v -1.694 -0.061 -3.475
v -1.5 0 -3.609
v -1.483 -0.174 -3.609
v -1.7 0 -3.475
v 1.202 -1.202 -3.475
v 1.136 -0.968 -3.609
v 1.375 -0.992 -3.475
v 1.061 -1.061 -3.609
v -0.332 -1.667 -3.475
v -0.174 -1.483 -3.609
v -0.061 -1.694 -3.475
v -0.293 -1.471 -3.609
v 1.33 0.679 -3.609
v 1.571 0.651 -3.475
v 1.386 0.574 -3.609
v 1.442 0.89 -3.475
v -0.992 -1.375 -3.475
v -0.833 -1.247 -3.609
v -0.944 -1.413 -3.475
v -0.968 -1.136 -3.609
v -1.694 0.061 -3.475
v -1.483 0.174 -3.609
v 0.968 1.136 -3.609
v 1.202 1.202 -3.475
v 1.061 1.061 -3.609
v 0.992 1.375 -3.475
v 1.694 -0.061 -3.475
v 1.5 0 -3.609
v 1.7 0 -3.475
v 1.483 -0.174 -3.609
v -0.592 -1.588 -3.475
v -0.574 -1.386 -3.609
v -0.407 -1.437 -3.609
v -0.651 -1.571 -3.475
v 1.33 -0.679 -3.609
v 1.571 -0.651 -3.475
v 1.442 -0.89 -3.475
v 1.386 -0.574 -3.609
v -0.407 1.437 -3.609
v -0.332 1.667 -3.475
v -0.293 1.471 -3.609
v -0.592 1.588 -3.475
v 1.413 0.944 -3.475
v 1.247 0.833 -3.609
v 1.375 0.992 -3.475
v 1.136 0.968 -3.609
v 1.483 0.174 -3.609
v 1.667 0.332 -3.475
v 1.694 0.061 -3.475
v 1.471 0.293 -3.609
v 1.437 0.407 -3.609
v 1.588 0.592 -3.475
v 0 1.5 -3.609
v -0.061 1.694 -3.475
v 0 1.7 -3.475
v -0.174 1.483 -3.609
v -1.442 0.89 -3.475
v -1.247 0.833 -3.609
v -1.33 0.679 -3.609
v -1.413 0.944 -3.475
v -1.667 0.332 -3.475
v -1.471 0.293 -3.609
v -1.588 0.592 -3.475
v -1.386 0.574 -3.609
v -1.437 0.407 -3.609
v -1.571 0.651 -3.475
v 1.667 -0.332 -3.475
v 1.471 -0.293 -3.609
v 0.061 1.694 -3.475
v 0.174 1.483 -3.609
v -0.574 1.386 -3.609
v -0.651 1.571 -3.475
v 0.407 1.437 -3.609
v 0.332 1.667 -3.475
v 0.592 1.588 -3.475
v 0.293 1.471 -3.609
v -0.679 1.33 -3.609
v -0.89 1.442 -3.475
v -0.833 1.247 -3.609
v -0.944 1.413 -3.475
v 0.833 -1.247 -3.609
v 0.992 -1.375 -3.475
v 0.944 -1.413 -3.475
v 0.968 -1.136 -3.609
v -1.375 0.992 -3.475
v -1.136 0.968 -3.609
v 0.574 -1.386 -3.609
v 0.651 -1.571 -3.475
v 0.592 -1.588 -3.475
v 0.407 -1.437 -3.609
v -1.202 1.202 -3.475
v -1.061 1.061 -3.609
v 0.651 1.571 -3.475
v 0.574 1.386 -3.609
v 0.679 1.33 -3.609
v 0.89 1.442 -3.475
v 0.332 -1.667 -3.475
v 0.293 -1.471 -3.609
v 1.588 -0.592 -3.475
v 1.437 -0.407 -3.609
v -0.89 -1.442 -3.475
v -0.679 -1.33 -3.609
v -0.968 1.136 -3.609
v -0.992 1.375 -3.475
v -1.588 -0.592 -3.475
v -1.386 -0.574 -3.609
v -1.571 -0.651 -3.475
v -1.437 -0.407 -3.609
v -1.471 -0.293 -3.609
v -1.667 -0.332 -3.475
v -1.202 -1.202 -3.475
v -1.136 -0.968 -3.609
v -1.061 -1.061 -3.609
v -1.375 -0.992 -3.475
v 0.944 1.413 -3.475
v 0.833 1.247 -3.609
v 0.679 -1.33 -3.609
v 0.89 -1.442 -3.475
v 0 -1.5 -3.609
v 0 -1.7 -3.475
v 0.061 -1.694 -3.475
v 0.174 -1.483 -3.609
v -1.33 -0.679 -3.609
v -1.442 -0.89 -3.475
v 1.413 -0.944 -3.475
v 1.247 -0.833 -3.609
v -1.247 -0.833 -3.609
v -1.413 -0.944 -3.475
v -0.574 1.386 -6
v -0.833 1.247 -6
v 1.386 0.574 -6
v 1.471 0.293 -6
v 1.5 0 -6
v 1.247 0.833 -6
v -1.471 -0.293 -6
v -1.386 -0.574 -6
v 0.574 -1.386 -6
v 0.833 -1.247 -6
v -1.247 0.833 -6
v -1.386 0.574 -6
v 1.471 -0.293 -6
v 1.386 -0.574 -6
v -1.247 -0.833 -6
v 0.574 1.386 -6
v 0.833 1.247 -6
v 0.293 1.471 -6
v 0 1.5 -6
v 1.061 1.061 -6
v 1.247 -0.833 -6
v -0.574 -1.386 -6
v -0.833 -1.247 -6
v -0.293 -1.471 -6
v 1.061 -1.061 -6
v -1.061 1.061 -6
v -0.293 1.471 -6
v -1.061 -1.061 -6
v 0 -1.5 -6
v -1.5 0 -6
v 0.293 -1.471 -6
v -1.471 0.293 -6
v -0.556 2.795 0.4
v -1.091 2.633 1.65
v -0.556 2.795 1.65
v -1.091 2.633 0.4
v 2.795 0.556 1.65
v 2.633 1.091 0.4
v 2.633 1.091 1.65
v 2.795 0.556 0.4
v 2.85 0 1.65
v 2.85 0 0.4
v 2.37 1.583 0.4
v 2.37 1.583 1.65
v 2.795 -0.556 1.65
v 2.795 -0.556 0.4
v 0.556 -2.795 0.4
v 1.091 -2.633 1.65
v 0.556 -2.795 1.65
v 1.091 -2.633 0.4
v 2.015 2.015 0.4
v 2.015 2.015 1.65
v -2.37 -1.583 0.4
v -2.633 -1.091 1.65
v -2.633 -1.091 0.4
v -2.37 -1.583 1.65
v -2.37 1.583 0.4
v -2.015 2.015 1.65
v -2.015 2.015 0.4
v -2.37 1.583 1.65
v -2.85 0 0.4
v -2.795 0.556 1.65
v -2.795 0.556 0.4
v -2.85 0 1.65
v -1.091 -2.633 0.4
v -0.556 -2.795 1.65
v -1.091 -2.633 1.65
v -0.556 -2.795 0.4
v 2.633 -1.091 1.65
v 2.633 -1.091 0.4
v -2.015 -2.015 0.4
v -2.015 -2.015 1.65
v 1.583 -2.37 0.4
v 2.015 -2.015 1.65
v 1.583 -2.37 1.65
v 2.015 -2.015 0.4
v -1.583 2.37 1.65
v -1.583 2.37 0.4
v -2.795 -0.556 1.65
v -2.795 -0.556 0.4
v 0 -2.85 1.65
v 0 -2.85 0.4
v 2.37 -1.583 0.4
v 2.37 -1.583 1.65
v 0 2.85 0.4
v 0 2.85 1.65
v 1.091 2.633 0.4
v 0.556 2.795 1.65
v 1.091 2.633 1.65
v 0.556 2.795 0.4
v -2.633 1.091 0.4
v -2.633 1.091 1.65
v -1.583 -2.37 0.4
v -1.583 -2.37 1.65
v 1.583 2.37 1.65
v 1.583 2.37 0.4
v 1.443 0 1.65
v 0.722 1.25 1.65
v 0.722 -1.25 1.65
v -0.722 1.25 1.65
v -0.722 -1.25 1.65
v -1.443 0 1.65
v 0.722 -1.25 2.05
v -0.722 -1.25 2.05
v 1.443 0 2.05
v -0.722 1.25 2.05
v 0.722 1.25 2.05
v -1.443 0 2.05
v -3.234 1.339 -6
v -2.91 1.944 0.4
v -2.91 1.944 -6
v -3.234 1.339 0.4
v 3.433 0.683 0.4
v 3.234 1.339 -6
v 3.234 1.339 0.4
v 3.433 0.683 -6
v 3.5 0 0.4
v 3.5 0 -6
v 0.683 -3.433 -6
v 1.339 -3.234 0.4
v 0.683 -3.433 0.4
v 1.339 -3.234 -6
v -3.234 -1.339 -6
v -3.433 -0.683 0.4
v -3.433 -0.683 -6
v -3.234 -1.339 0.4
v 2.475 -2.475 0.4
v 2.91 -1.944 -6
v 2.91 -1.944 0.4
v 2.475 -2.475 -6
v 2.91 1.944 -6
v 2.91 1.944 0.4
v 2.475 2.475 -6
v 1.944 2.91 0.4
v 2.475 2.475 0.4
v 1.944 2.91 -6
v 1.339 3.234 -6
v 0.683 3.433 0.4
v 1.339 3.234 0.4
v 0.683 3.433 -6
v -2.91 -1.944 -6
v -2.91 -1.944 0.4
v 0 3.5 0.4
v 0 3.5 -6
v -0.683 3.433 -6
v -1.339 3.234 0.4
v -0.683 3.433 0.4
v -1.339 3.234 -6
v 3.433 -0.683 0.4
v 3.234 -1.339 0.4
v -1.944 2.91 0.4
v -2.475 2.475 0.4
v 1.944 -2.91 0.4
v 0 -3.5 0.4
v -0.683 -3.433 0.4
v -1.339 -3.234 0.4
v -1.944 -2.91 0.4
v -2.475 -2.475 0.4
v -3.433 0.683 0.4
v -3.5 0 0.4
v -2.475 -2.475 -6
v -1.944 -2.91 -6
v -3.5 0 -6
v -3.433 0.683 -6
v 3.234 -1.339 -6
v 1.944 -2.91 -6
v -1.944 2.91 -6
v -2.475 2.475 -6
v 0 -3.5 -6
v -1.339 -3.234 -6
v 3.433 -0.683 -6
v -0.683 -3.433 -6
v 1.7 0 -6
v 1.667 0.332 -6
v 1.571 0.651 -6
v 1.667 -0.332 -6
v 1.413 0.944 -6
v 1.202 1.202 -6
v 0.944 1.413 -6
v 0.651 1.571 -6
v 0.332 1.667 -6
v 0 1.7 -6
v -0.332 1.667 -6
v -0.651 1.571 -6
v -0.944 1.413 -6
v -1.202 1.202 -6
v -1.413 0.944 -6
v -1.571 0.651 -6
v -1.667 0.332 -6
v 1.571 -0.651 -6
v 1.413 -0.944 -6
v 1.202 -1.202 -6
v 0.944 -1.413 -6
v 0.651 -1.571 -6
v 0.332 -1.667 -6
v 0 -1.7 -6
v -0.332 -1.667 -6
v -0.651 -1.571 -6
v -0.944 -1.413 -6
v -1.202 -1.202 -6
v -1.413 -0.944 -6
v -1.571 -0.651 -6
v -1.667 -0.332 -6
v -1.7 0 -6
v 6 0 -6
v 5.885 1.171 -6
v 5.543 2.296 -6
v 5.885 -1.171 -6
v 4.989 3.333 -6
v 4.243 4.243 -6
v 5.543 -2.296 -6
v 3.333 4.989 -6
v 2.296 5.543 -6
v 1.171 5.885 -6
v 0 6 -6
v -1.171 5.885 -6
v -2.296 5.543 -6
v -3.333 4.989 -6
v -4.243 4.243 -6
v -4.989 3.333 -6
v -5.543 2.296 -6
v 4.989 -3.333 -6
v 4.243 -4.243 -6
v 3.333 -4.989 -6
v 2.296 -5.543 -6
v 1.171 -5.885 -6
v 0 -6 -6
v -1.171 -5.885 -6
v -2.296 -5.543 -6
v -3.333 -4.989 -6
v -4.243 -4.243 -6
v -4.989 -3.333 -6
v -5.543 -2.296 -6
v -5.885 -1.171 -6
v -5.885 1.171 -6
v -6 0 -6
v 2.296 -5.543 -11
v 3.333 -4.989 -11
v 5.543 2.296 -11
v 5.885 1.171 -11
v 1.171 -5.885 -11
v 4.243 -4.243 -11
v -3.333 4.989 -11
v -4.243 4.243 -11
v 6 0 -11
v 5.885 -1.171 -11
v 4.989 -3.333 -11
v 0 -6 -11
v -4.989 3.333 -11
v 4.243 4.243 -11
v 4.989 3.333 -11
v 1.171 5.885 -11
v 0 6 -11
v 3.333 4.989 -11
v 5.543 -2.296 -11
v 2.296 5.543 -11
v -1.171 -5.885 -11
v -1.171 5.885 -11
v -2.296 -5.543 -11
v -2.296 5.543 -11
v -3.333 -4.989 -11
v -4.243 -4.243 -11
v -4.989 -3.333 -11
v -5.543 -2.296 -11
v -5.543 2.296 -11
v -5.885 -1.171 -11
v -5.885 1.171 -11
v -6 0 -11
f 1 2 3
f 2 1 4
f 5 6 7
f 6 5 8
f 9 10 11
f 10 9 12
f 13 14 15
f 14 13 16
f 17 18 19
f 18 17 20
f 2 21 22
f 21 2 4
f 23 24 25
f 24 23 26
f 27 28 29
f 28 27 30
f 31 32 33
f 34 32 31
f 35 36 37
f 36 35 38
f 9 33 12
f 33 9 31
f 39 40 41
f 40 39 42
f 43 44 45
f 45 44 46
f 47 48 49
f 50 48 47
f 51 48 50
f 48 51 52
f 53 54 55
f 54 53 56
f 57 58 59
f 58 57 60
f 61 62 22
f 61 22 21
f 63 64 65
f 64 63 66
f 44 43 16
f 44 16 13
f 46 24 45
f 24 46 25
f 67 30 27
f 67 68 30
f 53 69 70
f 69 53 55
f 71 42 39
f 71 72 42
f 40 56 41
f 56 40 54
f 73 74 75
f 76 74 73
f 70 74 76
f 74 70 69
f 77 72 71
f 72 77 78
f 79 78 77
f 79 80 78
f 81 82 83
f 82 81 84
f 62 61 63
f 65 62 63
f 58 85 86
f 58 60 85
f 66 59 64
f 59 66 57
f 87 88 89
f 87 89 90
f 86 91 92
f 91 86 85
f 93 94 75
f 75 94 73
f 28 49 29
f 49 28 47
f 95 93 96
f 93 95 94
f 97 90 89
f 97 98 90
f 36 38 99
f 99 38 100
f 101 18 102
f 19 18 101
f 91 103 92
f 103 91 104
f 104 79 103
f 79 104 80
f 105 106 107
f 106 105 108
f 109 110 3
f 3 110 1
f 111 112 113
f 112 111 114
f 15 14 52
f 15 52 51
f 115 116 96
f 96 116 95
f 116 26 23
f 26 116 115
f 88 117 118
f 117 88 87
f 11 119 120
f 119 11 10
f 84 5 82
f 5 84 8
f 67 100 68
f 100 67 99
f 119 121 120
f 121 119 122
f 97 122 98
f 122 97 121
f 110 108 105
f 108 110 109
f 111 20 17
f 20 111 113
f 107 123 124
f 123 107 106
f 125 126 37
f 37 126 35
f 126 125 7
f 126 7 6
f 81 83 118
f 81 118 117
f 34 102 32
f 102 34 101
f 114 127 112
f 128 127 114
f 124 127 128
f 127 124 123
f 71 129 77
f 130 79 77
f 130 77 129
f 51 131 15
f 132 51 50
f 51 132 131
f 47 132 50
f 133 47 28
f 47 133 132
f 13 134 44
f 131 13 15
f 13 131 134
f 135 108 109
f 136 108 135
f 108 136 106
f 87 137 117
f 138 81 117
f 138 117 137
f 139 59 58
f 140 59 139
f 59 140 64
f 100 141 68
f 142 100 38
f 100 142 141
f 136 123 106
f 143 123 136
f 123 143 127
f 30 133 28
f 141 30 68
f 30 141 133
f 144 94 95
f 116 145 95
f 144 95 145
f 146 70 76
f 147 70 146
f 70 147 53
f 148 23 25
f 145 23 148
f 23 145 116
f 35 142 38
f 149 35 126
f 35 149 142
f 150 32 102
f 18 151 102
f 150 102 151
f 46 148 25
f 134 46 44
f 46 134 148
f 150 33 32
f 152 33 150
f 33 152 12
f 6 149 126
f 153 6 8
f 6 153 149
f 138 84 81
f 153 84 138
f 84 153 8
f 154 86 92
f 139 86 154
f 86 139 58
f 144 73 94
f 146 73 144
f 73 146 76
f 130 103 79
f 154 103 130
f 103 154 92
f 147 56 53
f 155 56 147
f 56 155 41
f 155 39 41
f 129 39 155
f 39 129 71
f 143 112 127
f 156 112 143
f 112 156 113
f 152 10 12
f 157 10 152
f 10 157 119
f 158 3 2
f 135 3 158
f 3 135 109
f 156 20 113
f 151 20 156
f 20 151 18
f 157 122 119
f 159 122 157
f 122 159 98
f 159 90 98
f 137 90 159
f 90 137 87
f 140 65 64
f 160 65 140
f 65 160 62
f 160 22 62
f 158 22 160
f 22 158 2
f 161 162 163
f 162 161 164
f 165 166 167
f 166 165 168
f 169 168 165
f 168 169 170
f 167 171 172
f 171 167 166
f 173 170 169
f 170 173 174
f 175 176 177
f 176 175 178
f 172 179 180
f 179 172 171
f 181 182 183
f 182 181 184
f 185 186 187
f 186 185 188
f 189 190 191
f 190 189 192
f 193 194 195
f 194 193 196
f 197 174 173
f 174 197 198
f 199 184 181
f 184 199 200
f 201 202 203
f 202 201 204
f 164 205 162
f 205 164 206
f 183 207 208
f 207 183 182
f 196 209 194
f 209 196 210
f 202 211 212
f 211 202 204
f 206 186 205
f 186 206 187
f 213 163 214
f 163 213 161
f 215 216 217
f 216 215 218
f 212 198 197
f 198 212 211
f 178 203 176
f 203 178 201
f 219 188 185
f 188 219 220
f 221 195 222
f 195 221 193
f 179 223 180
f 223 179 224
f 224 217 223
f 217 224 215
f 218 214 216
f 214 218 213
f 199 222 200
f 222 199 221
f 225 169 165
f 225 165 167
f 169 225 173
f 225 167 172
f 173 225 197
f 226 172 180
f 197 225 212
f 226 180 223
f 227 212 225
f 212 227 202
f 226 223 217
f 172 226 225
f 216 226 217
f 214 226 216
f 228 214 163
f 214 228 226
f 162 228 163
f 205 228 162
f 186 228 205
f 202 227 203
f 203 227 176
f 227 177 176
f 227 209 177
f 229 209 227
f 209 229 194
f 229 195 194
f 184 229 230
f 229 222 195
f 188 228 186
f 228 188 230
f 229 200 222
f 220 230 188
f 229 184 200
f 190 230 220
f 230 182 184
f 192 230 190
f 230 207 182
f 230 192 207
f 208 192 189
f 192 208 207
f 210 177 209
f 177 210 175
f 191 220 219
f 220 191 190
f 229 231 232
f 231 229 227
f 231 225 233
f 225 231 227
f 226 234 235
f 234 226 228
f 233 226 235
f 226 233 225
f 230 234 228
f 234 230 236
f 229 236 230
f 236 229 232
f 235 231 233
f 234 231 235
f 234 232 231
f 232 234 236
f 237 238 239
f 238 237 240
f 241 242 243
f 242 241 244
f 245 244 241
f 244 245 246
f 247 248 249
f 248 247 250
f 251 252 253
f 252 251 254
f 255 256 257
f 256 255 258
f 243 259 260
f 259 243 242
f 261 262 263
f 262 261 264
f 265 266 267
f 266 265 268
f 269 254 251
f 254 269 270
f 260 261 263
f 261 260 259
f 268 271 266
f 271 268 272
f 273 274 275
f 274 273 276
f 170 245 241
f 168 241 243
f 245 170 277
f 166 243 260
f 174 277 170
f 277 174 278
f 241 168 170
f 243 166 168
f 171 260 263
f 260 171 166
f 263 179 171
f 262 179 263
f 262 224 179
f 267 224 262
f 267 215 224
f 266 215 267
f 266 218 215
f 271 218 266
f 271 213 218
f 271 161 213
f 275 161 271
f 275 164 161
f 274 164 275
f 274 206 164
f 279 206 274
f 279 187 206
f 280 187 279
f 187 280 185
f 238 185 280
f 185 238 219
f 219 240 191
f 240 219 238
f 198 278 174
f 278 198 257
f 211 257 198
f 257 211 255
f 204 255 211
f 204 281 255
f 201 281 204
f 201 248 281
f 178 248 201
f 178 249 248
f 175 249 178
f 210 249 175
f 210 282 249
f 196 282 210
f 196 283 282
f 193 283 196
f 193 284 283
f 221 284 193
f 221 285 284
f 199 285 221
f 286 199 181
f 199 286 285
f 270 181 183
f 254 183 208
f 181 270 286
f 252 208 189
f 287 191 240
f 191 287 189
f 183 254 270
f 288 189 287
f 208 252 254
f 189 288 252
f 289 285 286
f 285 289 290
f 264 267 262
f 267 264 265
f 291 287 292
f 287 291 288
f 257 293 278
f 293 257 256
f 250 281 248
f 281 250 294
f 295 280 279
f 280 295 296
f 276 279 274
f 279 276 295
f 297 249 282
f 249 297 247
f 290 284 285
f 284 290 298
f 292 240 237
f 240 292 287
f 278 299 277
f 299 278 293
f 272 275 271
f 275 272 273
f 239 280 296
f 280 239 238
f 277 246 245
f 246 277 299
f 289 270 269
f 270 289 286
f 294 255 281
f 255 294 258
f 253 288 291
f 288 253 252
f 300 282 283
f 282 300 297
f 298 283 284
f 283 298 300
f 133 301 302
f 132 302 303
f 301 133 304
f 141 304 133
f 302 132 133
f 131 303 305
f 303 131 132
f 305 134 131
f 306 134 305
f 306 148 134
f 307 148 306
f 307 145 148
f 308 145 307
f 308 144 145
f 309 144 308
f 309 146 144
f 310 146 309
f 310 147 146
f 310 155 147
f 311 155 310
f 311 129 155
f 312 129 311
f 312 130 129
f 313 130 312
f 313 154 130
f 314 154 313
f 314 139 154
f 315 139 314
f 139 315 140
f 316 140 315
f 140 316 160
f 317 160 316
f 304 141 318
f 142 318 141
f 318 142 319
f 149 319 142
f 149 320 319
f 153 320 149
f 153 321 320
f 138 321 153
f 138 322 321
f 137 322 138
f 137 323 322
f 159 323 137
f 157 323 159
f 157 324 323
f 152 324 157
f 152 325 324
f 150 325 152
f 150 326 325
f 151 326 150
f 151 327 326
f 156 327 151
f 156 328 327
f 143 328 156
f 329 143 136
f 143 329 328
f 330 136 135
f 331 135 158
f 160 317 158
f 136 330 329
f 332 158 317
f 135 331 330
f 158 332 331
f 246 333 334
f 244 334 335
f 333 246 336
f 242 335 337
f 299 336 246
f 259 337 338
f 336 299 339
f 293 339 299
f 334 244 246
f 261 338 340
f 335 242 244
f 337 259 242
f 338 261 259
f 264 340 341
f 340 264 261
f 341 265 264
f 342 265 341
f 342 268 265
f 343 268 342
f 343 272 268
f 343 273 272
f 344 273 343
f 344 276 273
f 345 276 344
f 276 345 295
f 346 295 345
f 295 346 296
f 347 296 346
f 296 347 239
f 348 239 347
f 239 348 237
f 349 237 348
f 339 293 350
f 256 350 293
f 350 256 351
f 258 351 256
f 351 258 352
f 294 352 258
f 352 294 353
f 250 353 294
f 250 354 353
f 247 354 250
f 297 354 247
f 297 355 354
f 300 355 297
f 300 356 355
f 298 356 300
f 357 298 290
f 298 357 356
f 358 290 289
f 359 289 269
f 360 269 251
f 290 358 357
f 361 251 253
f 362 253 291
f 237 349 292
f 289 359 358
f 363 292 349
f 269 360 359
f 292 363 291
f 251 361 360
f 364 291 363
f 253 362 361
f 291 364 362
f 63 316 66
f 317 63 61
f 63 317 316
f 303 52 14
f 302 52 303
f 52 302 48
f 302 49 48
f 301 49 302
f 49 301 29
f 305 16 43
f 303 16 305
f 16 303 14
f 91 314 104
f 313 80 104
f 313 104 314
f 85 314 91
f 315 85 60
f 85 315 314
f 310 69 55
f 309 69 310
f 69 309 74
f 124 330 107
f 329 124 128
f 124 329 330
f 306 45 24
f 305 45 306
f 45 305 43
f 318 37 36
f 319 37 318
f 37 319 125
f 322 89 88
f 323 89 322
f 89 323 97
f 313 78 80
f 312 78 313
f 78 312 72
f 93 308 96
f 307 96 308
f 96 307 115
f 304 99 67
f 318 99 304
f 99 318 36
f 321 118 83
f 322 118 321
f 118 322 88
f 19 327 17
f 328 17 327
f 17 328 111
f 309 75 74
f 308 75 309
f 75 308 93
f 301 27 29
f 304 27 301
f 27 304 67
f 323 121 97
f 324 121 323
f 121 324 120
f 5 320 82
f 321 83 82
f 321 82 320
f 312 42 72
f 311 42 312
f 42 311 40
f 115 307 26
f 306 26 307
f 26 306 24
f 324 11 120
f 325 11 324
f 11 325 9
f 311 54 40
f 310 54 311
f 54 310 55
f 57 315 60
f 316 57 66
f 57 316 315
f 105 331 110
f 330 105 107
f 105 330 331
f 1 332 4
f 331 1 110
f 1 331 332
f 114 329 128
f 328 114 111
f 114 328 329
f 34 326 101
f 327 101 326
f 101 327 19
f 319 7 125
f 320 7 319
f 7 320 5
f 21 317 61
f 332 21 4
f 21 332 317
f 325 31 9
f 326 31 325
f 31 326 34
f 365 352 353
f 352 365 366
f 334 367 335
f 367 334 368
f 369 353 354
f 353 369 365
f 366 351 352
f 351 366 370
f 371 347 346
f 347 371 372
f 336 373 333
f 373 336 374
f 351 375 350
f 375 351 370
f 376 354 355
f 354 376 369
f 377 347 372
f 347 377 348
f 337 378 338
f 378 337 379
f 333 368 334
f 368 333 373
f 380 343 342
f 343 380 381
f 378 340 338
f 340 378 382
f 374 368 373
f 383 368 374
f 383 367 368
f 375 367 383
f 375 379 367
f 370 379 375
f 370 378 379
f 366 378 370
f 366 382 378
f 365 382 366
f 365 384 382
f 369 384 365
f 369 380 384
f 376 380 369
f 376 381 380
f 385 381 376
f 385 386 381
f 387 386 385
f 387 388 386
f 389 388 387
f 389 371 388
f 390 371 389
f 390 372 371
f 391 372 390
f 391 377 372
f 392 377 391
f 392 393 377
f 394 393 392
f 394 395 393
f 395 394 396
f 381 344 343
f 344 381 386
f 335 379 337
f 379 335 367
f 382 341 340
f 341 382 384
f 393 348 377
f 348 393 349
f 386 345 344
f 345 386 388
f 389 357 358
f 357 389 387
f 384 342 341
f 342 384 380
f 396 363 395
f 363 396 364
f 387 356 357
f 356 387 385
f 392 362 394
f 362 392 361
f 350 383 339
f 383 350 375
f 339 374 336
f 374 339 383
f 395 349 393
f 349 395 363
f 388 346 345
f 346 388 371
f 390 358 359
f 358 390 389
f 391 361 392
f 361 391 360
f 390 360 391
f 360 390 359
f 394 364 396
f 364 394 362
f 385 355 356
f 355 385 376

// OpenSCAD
// Parameters
thread_diameter_mm = 3.0; //[1.5:6.0:0.1]
overall_length_mm = 10.0; //[5.0:20.0:0.5]
head_diameter_mm = 5.7; //[3.0:11.4:0.1]
head_height_mm = 1.65; //[0.8:3.3:0.05]
overlap_mm = 0.8; //[0.5:2.0:0.1]
thread_major_radius_mm = 1.5; //[0.75:3.0:0.05]
head_radius_mm = 2.85; //[1.5:5.7:0.05]
socket_af_mm = 2.5; //[1.5:4.0:0.1]
socket_depth_mm = 1.2; //[0.6:2.4:0.1]
washer_outer_diameter_mm = 7.0; //[4.0:14.0:0.1]
washer_thickness_mm = 0.8; //[0.4:1.6:0.05]
washer_hole_diameter_mm = 3.4; //[3.1:4.5:0.05]
spacer_height_mm = 6.0; //[3.0:12.0:0.5]
spacer_wall_mm = 1.8; //[0.9:3.6:0.1]
spacer_inner_diameter_mm = 3.4; //[3.1:4.5:0.05]
buzzer_diameter_mm = 12.0; //[6.0:24.0:0.5]
buzzer_height_mm = 5.0; //[2.5:10.0:0.5]
buzzer_stem_diameter_mm = 3.0; //[1.5:6.0:0.1]
buzzer_stem_height_mm = 2.0; //[1.0:4.0:0.1]

// Screw and Washer - complete geometry
module screw_and_washer() {
  color("DimGray") {
    // Threaded Shaft
    translate([0, 0, -overall_length_mm/2])
      cylinder(h=overall_length_mm, r=thread_diameter_mm/2, center=true, $fn=32);
    
    // Dome Head
    intersection() {
      translate([0, 0, head_height_mm - head_diameter_mm/2])
        sphere(r=head_diameter_mm/2, $fn=32);
      translate([0, 0, head_height_mm - head_diameter_mm])
        cube([head_diameter_mm*2, head_diameter_mm*2, head_diameter_mm*2], center=true);
    }
    translate([0, 0, head_height_mm/2])
      cylinder(h=head_height_mm, r=head_diameter_mm/2, center=true, $fn=32);
    
    // Hex Socket Recess
    translate([0, 0, head_height_mm - socket_depth_mm/2])
      rotate([0, 0, 0])
        difference() {
          cylinder(h=socket_depth_mm + overlap_mm, r=(socket_af_mm/cos(30))/2, center=true, $fn=6);
        }
  }
  
  // Washer
  color("Silver") {
    difference() {
      translate([0, 0, -washer_thickness_mm/2 + overlap_mm/2])
        cylinder(h=washer_thickness_mm, r=washer_outer_diameter_mm/2, center=true, $fn=32);
      translate([0, 0, -washer_thickness_mm/2 + overlap_mm/2])
        cylinder(h=washer_thickness_mm + overlap_mm*2, r=washer_hole_diameter_mm/2, center=true, $fn=32);
    }
  }
}

// PCB Spacer - complete geometry
module pcb_spacer() {
  color("Silver") {
    difference() {
      translate([0, 0, -washer_thickness_mm - spacer_height_mm/2 + overlap_mm])
        cylinder(h=spacer_height_mm, r=spacer_inner_diameter_mm/2 + spacer_wall_mm, center=true, $fn=32);
      translate([0, 0, -washer_thickness_mm - spacer_height_mm/2 + overlap_mm])
        cylinder(h=spacer_height_mm + overlap_mm*2, r=spacer_inner_diameter_mm/2, center=true, $fn=32);
    }
  }
}

// Buzzer - complete geometry
module buzzer() {
  color("Black") {
    // Buzzer Body
    translate([0, 0, -washer_thickness_mm - spacer_height_mm - buzzer_height_mm/2 + overlap_mm])
      cylinder(h=buzzer_height_mm, r=buzzer_diameter_mm/2, center=true, $fn=32);
    
    // Buzzer Stem
    translate([0, 0, -washer_thickness_mm - spacer_height_mm + buzzer_stem_height_mm/2 - overlap_mm/2])
      cylinder(h=buzzer_stem_height_mm, r=buzzer_stem_diameter_mm/2, center=true, $fn=32);
  }
}

// Assembly
module assembly() {
  screw_and_washer();
  pcb_spacer();
  buzzer();
}

assembly();
